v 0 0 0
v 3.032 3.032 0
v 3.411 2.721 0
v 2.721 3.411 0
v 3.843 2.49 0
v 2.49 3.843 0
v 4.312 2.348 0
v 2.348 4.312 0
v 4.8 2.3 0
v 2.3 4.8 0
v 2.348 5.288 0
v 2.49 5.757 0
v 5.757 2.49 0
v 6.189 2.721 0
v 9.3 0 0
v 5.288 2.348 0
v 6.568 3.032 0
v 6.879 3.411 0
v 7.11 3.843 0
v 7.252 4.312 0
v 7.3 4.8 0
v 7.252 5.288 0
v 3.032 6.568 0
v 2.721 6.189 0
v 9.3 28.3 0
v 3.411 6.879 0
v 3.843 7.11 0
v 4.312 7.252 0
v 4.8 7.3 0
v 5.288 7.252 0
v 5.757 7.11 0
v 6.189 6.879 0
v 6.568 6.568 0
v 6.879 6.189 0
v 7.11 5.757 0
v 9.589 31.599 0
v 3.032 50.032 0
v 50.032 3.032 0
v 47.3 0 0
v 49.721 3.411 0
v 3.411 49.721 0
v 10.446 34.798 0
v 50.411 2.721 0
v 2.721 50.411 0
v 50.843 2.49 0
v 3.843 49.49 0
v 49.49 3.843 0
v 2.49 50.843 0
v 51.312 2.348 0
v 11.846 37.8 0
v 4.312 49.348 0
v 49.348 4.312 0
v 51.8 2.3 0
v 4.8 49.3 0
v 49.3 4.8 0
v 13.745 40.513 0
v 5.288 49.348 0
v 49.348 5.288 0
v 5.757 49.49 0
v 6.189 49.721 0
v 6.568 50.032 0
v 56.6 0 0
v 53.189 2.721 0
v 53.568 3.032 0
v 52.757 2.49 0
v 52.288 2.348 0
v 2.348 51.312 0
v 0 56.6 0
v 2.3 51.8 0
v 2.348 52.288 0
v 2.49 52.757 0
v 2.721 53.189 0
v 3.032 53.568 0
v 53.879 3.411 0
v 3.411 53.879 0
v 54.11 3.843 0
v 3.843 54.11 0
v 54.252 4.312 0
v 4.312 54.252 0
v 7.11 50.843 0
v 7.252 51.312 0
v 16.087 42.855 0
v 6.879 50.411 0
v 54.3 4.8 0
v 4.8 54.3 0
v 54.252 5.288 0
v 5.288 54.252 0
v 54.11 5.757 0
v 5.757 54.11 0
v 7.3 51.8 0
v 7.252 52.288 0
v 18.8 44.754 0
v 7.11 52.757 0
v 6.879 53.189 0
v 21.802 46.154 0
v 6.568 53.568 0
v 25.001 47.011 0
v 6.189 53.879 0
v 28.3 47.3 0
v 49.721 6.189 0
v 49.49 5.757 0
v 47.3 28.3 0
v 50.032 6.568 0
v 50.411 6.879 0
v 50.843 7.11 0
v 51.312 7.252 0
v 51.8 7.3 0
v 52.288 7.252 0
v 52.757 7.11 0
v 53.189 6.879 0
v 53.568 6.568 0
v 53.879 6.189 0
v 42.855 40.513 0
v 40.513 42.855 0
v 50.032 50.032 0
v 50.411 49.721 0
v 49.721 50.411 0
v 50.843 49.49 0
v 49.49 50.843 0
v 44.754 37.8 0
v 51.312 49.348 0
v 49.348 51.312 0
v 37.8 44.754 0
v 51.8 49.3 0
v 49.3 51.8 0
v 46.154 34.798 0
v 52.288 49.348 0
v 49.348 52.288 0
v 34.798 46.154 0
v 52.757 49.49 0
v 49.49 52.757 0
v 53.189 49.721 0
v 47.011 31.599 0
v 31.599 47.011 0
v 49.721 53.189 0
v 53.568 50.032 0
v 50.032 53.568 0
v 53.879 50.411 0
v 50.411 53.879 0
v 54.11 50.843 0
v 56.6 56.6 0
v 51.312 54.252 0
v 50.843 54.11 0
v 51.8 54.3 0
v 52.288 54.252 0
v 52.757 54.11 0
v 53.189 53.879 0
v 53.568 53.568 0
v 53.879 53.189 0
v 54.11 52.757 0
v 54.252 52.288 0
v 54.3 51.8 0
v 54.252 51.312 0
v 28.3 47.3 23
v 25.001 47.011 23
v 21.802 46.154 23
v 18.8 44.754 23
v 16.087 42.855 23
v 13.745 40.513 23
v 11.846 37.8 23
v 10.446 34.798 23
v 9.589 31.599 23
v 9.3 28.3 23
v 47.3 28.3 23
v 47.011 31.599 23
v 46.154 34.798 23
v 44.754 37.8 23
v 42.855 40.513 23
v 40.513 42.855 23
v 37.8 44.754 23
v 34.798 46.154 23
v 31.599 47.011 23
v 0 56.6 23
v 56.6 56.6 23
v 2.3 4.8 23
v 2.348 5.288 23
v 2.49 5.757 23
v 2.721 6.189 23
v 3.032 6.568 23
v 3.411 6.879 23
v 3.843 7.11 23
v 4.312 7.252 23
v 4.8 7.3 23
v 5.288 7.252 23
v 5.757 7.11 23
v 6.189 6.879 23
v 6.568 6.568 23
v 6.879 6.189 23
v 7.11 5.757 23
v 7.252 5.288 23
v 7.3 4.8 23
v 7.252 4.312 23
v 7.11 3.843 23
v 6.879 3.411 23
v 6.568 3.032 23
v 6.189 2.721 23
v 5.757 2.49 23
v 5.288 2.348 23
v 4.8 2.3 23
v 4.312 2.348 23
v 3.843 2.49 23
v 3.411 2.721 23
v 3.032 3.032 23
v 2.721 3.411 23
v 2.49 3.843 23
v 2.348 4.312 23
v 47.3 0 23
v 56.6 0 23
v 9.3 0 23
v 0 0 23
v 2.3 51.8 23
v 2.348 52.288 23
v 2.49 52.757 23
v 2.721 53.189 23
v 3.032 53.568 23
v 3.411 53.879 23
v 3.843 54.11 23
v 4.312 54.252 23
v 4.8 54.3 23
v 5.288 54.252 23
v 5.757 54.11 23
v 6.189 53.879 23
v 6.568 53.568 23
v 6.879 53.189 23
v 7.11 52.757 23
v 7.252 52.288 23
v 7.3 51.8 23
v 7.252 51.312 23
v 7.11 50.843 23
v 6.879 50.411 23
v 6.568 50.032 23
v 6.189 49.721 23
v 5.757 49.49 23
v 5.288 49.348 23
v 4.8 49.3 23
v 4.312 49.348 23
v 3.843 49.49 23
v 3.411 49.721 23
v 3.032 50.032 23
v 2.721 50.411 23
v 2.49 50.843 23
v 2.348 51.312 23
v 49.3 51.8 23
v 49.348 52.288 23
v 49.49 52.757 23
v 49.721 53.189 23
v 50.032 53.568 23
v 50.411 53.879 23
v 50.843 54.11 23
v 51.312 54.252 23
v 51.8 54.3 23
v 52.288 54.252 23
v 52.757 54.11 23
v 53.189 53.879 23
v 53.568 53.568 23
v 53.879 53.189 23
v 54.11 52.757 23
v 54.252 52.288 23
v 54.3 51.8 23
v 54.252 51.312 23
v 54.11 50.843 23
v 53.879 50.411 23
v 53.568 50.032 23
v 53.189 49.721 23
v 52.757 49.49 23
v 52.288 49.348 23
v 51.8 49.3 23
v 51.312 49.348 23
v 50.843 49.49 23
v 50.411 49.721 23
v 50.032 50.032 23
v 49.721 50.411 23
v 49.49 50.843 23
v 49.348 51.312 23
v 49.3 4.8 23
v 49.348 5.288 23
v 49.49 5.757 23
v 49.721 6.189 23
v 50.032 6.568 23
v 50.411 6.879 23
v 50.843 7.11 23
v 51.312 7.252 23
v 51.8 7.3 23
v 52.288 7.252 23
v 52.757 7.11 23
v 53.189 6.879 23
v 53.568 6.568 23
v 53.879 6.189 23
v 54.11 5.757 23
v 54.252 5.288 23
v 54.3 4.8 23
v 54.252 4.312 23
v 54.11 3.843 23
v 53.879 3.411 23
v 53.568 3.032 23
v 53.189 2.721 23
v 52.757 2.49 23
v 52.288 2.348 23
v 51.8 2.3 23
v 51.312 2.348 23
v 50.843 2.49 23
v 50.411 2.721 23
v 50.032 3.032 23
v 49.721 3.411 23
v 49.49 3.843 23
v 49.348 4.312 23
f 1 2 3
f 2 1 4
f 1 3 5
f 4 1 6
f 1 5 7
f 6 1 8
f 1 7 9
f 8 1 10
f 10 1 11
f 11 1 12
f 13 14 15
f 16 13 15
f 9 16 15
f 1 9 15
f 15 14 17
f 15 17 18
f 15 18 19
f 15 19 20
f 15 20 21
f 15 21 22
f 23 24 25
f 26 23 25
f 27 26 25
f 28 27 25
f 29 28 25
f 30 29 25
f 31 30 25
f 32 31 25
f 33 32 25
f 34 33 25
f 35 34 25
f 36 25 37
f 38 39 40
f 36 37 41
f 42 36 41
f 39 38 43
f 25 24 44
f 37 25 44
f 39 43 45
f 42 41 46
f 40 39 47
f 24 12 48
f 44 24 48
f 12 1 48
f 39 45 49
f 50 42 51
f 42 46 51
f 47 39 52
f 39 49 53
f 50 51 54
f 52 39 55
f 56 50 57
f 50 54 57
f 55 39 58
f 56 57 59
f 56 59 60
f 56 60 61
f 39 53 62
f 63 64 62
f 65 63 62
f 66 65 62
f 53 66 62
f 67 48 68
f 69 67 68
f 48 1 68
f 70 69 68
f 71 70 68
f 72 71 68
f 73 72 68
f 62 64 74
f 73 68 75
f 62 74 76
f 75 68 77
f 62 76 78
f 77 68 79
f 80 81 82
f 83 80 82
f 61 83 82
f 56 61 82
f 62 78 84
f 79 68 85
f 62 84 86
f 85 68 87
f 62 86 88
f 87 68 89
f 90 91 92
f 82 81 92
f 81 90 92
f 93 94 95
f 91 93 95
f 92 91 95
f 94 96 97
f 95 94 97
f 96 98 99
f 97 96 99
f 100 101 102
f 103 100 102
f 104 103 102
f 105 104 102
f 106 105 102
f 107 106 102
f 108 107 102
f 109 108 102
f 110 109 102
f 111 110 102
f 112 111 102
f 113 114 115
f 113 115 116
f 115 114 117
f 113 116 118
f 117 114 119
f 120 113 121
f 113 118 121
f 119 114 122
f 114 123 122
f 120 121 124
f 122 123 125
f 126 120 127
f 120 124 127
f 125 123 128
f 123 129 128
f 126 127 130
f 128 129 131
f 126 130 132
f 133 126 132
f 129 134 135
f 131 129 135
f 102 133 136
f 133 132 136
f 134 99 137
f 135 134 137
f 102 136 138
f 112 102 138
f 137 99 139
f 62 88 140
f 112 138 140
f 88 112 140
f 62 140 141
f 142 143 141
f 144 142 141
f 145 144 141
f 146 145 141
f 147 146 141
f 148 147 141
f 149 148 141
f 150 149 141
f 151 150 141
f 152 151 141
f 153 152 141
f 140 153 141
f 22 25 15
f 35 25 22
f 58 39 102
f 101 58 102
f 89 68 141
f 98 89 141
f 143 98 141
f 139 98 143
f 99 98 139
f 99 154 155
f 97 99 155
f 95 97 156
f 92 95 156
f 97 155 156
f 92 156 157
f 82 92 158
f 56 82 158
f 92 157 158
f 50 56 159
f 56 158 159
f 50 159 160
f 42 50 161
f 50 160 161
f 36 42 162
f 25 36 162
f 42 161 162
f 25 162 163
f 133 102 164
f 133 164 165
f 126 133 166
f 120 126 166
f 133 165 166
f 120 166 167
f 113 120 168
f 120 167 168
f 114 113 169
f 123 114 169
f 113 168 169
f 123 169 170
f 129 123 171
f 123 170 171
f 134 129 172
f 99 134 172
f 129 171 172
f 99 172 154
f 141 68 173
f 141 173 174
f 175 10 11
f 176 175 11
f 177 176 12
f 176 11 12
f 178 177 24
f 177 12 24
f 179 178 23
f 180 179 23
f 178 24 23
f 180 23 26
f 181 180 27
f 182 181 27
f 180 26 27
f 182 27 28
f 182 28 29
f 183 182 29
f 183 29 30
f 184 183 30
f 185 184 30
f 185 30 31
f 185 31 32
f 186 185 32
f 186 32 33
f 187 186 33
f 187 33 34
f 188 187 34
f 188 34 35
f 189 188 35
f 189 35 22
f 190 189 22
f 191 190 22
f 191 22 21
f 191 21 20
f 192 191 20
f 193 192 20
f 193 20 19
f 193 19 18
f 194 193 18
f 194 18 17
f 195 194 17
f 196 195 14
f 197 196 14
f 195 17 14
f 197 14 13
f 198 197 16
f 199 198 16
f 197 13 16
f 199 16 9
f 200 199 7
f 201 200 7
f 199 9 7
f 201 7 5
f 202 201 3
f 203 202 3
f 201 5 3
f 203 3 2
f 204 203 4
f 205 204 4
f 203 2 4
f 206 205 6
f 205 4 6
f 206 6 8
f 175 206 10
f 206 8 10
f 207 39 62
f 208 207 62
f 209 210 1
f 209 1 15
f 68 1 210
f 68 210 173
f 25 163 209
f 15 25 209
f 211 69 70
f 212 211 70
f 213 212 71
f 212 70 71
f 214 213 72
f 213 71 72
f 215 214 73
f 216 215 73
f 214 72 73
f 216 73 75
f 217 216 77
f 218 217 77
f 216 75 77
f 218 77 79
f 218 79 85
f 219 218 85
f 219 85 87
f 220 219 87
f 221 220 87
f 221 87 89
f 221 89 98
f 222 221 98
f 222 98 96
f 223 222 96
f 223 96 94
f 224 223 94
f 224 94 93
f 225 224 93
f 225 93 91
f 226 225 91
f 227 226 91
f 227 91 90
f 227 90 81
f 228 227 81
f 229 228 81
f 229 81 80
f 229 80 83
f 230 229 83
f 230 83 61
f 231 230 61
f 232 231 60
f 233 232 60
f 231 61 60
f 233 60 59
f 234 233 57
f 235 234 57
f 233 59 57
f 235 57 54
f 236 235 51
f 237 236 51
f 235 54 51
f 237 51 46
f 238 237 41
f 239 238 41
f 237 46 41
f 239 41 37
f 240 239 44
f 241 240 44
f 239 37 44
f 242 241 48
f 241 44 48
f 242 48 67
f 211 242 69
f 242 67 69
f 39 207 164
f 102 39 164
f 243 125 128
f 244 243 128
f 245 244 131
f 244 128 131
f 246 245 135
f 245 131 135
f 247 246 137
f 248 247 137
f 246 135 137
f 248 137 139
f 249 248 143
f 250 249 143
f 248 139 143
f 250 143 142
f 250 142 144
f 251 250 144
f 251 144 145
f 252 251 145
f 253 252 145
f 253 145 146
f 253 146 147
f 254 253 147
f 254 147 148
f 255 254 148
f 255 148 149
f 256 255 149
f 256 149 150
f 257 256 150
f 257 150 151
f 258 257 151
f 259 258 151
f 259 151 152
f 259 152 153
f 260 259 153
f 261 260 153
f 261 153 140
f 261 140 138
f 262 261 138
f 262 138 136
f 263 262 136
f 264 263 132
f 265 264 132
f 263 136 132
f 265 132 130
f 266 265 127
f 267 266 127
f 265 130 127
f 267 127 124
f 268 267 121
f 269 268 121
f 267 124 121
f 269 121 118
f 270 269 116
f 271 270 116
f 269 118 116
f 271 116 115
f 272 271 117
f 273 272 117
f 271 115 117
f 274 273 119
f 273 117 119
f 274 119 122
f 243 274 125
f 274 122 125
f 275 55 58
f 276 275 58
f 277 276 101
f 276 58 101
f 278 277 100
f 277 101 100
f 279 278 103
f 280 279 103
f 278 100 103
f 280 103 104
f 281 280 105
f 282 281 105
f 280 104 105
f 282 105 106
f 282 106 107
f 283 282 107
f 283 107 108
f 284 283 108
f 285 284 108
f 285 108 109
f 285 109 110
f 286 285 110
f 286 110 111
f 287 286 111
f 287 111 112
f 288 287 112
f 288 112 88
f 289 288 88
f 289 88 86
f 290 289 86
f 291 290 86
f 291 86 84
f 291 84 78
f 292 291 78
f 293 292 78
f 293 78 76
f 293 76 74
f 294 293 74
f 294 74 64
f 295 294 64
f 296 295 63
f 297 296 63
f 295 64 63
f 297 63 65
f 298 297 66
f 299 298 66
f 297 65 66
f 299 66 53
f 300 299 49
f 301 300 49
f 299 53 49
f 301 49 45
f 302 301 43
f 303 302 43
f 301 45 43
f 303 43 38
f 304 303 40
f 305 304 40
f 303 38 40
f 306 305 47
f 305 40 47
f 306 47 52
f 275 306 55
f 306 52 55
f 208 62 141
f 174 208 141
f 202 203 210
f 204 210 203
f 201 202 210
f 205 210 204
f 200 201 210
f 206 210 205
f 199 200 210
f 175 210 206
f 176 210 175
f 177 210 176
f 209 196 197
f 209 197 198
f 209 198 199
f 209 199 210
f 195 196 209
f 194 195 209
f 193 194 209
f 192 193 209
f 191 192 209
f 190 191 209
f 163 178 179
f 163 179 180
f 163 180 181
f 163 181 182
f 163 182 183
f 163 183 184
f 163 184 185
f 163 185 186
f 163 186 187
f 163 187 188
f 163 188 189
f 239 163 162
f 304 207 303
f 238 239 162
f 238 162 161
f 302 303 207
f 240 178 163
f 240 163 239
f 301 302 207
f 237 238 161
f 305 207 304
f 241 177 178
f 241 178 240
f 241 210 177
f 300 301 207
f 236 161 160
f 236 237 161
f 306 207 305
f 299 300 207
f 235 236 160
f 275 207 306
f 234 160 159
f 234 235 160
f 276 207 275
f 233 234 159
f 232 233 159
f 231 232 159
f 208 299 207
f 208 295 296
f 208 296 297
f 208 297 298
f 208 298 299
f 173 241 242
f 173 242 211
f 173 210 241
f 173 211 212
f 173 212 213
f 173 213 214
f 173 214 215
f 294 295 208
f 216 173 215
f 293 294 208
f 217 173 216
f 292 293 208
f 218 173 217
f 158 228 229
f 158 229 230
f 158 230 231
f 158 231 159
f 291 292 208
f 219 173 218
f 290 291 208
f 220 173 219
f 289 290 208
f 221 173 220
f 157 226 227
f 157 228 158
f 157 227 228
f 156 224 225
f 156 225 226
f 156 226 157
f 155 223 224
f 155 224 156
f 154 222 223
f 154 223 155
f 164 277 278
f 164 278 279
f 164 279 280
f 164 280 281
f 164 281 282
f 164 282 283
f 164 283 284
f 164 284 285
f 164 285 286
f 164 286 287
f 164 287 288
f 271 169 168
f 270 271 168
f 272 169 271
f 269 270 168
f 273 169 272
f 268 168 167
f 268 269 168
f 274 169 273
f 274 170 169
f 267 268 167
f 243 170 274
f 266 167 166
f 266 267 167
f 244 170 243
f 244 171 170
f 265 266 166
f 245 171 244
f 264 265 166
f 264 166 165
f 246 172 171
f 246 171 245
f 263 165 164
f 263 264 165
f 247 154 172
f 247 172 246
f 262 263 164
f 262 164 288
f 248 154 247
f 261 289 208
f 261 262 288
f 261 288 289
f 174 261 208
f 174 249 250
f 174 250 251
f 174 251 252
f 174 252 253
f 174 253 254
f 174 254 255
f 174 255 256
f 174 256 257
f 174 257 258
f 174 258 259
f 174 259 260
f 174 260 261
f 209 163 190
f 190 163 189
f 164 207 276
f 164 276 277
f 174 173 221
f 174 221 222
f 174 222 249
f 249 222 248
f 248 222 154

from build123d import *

# Parameters (mm, degrees)
F0_W     = 56.6
F0_H     = 56.6
F1_DEPTH = 23
F3_DEPTH = 23
F5_D     = 5


with BuildPart() as f1:
    # F0 (on Top) → F1 (new body)
    with BuildSketch(Plane.XY):
        with Locations((28.3, 28.3)):
            Rectangle(F0_W, F0_H)
    extrude(amount=F1_DEPTH)

    # F2 (on face) → F3 (cut, through all)
    with BuildSketch(Plane.XY.offset(23)):
        with BuildLine():
            Line((28.3, 28.3), (47.3, 28.3))
            ThreePointArc((47.3, 28.3), (41.7350288425, 41.7350288425), (28.3, 47.3))
            Line((28.3, 47.3), (28.3, 28.3))
        make_face()
        with BuildLine():
            Line((47.3, 0), (47.3, 28.3))
            ThreePointArc((47.3, 28.3), (41.7350288425, 14.8649711575), (28.3, 9.3))
            Line((28.3, 9.3), (28.3, 0))
            Line((28.3, 0), (47.3, 0))
        make_face()
        with BuildLine():
            ThreePointArc((28.3, 9.3), (41.7350288425, 14.8649711575), (47.3, 28.3))
            Line((47.3, 28.3), (28.3, 28.3))
            Line((28.3, 28.3), (28.3, 9.3))
        make_face()
        with BuildLine():
            Line((28.3, 28.3), (28.3, 47.3))
            ThreePointArc((28.3, 47.3), (14.8649711575, 41.7350288425), (9.3, 28.3))
            Line((9.3, 28.3), (28.3, 28.3))
        make_face()
        with BuildLine():
            Line((28.3, 0), (28.3, 9.3))
            ThreePointArc((28.3, 9.3), (14.8649711575, 14.8649711575), (9.3, 28.3))
            Line((9.3, 28.3), (9.3, 0))
            Line((9.3, 0), (28.3, 0))
        make_face()
        with BuildLine():
            ThreePointArc((9.3, 28.3), (14.8649711575, 14.8649711575), (28.3, 9.3))
            Line((28.3, 9.3), (28.3, 28.3))
            Line((28.3, 28.3), (9.3, 28.3))
        make_face()
    extrude(amount=-F3_DEPTH, mode=Mode.SUBTRACT)

    # F5 (through all)
    with Locations(Plane.XY.offset(23)):
        with Locations((4.8, 51.8), (51.8, 51.8), (51.8, 4.8), (4.8, 4.8)):
            Hole(F5_D / 2)


solid = f1.part
